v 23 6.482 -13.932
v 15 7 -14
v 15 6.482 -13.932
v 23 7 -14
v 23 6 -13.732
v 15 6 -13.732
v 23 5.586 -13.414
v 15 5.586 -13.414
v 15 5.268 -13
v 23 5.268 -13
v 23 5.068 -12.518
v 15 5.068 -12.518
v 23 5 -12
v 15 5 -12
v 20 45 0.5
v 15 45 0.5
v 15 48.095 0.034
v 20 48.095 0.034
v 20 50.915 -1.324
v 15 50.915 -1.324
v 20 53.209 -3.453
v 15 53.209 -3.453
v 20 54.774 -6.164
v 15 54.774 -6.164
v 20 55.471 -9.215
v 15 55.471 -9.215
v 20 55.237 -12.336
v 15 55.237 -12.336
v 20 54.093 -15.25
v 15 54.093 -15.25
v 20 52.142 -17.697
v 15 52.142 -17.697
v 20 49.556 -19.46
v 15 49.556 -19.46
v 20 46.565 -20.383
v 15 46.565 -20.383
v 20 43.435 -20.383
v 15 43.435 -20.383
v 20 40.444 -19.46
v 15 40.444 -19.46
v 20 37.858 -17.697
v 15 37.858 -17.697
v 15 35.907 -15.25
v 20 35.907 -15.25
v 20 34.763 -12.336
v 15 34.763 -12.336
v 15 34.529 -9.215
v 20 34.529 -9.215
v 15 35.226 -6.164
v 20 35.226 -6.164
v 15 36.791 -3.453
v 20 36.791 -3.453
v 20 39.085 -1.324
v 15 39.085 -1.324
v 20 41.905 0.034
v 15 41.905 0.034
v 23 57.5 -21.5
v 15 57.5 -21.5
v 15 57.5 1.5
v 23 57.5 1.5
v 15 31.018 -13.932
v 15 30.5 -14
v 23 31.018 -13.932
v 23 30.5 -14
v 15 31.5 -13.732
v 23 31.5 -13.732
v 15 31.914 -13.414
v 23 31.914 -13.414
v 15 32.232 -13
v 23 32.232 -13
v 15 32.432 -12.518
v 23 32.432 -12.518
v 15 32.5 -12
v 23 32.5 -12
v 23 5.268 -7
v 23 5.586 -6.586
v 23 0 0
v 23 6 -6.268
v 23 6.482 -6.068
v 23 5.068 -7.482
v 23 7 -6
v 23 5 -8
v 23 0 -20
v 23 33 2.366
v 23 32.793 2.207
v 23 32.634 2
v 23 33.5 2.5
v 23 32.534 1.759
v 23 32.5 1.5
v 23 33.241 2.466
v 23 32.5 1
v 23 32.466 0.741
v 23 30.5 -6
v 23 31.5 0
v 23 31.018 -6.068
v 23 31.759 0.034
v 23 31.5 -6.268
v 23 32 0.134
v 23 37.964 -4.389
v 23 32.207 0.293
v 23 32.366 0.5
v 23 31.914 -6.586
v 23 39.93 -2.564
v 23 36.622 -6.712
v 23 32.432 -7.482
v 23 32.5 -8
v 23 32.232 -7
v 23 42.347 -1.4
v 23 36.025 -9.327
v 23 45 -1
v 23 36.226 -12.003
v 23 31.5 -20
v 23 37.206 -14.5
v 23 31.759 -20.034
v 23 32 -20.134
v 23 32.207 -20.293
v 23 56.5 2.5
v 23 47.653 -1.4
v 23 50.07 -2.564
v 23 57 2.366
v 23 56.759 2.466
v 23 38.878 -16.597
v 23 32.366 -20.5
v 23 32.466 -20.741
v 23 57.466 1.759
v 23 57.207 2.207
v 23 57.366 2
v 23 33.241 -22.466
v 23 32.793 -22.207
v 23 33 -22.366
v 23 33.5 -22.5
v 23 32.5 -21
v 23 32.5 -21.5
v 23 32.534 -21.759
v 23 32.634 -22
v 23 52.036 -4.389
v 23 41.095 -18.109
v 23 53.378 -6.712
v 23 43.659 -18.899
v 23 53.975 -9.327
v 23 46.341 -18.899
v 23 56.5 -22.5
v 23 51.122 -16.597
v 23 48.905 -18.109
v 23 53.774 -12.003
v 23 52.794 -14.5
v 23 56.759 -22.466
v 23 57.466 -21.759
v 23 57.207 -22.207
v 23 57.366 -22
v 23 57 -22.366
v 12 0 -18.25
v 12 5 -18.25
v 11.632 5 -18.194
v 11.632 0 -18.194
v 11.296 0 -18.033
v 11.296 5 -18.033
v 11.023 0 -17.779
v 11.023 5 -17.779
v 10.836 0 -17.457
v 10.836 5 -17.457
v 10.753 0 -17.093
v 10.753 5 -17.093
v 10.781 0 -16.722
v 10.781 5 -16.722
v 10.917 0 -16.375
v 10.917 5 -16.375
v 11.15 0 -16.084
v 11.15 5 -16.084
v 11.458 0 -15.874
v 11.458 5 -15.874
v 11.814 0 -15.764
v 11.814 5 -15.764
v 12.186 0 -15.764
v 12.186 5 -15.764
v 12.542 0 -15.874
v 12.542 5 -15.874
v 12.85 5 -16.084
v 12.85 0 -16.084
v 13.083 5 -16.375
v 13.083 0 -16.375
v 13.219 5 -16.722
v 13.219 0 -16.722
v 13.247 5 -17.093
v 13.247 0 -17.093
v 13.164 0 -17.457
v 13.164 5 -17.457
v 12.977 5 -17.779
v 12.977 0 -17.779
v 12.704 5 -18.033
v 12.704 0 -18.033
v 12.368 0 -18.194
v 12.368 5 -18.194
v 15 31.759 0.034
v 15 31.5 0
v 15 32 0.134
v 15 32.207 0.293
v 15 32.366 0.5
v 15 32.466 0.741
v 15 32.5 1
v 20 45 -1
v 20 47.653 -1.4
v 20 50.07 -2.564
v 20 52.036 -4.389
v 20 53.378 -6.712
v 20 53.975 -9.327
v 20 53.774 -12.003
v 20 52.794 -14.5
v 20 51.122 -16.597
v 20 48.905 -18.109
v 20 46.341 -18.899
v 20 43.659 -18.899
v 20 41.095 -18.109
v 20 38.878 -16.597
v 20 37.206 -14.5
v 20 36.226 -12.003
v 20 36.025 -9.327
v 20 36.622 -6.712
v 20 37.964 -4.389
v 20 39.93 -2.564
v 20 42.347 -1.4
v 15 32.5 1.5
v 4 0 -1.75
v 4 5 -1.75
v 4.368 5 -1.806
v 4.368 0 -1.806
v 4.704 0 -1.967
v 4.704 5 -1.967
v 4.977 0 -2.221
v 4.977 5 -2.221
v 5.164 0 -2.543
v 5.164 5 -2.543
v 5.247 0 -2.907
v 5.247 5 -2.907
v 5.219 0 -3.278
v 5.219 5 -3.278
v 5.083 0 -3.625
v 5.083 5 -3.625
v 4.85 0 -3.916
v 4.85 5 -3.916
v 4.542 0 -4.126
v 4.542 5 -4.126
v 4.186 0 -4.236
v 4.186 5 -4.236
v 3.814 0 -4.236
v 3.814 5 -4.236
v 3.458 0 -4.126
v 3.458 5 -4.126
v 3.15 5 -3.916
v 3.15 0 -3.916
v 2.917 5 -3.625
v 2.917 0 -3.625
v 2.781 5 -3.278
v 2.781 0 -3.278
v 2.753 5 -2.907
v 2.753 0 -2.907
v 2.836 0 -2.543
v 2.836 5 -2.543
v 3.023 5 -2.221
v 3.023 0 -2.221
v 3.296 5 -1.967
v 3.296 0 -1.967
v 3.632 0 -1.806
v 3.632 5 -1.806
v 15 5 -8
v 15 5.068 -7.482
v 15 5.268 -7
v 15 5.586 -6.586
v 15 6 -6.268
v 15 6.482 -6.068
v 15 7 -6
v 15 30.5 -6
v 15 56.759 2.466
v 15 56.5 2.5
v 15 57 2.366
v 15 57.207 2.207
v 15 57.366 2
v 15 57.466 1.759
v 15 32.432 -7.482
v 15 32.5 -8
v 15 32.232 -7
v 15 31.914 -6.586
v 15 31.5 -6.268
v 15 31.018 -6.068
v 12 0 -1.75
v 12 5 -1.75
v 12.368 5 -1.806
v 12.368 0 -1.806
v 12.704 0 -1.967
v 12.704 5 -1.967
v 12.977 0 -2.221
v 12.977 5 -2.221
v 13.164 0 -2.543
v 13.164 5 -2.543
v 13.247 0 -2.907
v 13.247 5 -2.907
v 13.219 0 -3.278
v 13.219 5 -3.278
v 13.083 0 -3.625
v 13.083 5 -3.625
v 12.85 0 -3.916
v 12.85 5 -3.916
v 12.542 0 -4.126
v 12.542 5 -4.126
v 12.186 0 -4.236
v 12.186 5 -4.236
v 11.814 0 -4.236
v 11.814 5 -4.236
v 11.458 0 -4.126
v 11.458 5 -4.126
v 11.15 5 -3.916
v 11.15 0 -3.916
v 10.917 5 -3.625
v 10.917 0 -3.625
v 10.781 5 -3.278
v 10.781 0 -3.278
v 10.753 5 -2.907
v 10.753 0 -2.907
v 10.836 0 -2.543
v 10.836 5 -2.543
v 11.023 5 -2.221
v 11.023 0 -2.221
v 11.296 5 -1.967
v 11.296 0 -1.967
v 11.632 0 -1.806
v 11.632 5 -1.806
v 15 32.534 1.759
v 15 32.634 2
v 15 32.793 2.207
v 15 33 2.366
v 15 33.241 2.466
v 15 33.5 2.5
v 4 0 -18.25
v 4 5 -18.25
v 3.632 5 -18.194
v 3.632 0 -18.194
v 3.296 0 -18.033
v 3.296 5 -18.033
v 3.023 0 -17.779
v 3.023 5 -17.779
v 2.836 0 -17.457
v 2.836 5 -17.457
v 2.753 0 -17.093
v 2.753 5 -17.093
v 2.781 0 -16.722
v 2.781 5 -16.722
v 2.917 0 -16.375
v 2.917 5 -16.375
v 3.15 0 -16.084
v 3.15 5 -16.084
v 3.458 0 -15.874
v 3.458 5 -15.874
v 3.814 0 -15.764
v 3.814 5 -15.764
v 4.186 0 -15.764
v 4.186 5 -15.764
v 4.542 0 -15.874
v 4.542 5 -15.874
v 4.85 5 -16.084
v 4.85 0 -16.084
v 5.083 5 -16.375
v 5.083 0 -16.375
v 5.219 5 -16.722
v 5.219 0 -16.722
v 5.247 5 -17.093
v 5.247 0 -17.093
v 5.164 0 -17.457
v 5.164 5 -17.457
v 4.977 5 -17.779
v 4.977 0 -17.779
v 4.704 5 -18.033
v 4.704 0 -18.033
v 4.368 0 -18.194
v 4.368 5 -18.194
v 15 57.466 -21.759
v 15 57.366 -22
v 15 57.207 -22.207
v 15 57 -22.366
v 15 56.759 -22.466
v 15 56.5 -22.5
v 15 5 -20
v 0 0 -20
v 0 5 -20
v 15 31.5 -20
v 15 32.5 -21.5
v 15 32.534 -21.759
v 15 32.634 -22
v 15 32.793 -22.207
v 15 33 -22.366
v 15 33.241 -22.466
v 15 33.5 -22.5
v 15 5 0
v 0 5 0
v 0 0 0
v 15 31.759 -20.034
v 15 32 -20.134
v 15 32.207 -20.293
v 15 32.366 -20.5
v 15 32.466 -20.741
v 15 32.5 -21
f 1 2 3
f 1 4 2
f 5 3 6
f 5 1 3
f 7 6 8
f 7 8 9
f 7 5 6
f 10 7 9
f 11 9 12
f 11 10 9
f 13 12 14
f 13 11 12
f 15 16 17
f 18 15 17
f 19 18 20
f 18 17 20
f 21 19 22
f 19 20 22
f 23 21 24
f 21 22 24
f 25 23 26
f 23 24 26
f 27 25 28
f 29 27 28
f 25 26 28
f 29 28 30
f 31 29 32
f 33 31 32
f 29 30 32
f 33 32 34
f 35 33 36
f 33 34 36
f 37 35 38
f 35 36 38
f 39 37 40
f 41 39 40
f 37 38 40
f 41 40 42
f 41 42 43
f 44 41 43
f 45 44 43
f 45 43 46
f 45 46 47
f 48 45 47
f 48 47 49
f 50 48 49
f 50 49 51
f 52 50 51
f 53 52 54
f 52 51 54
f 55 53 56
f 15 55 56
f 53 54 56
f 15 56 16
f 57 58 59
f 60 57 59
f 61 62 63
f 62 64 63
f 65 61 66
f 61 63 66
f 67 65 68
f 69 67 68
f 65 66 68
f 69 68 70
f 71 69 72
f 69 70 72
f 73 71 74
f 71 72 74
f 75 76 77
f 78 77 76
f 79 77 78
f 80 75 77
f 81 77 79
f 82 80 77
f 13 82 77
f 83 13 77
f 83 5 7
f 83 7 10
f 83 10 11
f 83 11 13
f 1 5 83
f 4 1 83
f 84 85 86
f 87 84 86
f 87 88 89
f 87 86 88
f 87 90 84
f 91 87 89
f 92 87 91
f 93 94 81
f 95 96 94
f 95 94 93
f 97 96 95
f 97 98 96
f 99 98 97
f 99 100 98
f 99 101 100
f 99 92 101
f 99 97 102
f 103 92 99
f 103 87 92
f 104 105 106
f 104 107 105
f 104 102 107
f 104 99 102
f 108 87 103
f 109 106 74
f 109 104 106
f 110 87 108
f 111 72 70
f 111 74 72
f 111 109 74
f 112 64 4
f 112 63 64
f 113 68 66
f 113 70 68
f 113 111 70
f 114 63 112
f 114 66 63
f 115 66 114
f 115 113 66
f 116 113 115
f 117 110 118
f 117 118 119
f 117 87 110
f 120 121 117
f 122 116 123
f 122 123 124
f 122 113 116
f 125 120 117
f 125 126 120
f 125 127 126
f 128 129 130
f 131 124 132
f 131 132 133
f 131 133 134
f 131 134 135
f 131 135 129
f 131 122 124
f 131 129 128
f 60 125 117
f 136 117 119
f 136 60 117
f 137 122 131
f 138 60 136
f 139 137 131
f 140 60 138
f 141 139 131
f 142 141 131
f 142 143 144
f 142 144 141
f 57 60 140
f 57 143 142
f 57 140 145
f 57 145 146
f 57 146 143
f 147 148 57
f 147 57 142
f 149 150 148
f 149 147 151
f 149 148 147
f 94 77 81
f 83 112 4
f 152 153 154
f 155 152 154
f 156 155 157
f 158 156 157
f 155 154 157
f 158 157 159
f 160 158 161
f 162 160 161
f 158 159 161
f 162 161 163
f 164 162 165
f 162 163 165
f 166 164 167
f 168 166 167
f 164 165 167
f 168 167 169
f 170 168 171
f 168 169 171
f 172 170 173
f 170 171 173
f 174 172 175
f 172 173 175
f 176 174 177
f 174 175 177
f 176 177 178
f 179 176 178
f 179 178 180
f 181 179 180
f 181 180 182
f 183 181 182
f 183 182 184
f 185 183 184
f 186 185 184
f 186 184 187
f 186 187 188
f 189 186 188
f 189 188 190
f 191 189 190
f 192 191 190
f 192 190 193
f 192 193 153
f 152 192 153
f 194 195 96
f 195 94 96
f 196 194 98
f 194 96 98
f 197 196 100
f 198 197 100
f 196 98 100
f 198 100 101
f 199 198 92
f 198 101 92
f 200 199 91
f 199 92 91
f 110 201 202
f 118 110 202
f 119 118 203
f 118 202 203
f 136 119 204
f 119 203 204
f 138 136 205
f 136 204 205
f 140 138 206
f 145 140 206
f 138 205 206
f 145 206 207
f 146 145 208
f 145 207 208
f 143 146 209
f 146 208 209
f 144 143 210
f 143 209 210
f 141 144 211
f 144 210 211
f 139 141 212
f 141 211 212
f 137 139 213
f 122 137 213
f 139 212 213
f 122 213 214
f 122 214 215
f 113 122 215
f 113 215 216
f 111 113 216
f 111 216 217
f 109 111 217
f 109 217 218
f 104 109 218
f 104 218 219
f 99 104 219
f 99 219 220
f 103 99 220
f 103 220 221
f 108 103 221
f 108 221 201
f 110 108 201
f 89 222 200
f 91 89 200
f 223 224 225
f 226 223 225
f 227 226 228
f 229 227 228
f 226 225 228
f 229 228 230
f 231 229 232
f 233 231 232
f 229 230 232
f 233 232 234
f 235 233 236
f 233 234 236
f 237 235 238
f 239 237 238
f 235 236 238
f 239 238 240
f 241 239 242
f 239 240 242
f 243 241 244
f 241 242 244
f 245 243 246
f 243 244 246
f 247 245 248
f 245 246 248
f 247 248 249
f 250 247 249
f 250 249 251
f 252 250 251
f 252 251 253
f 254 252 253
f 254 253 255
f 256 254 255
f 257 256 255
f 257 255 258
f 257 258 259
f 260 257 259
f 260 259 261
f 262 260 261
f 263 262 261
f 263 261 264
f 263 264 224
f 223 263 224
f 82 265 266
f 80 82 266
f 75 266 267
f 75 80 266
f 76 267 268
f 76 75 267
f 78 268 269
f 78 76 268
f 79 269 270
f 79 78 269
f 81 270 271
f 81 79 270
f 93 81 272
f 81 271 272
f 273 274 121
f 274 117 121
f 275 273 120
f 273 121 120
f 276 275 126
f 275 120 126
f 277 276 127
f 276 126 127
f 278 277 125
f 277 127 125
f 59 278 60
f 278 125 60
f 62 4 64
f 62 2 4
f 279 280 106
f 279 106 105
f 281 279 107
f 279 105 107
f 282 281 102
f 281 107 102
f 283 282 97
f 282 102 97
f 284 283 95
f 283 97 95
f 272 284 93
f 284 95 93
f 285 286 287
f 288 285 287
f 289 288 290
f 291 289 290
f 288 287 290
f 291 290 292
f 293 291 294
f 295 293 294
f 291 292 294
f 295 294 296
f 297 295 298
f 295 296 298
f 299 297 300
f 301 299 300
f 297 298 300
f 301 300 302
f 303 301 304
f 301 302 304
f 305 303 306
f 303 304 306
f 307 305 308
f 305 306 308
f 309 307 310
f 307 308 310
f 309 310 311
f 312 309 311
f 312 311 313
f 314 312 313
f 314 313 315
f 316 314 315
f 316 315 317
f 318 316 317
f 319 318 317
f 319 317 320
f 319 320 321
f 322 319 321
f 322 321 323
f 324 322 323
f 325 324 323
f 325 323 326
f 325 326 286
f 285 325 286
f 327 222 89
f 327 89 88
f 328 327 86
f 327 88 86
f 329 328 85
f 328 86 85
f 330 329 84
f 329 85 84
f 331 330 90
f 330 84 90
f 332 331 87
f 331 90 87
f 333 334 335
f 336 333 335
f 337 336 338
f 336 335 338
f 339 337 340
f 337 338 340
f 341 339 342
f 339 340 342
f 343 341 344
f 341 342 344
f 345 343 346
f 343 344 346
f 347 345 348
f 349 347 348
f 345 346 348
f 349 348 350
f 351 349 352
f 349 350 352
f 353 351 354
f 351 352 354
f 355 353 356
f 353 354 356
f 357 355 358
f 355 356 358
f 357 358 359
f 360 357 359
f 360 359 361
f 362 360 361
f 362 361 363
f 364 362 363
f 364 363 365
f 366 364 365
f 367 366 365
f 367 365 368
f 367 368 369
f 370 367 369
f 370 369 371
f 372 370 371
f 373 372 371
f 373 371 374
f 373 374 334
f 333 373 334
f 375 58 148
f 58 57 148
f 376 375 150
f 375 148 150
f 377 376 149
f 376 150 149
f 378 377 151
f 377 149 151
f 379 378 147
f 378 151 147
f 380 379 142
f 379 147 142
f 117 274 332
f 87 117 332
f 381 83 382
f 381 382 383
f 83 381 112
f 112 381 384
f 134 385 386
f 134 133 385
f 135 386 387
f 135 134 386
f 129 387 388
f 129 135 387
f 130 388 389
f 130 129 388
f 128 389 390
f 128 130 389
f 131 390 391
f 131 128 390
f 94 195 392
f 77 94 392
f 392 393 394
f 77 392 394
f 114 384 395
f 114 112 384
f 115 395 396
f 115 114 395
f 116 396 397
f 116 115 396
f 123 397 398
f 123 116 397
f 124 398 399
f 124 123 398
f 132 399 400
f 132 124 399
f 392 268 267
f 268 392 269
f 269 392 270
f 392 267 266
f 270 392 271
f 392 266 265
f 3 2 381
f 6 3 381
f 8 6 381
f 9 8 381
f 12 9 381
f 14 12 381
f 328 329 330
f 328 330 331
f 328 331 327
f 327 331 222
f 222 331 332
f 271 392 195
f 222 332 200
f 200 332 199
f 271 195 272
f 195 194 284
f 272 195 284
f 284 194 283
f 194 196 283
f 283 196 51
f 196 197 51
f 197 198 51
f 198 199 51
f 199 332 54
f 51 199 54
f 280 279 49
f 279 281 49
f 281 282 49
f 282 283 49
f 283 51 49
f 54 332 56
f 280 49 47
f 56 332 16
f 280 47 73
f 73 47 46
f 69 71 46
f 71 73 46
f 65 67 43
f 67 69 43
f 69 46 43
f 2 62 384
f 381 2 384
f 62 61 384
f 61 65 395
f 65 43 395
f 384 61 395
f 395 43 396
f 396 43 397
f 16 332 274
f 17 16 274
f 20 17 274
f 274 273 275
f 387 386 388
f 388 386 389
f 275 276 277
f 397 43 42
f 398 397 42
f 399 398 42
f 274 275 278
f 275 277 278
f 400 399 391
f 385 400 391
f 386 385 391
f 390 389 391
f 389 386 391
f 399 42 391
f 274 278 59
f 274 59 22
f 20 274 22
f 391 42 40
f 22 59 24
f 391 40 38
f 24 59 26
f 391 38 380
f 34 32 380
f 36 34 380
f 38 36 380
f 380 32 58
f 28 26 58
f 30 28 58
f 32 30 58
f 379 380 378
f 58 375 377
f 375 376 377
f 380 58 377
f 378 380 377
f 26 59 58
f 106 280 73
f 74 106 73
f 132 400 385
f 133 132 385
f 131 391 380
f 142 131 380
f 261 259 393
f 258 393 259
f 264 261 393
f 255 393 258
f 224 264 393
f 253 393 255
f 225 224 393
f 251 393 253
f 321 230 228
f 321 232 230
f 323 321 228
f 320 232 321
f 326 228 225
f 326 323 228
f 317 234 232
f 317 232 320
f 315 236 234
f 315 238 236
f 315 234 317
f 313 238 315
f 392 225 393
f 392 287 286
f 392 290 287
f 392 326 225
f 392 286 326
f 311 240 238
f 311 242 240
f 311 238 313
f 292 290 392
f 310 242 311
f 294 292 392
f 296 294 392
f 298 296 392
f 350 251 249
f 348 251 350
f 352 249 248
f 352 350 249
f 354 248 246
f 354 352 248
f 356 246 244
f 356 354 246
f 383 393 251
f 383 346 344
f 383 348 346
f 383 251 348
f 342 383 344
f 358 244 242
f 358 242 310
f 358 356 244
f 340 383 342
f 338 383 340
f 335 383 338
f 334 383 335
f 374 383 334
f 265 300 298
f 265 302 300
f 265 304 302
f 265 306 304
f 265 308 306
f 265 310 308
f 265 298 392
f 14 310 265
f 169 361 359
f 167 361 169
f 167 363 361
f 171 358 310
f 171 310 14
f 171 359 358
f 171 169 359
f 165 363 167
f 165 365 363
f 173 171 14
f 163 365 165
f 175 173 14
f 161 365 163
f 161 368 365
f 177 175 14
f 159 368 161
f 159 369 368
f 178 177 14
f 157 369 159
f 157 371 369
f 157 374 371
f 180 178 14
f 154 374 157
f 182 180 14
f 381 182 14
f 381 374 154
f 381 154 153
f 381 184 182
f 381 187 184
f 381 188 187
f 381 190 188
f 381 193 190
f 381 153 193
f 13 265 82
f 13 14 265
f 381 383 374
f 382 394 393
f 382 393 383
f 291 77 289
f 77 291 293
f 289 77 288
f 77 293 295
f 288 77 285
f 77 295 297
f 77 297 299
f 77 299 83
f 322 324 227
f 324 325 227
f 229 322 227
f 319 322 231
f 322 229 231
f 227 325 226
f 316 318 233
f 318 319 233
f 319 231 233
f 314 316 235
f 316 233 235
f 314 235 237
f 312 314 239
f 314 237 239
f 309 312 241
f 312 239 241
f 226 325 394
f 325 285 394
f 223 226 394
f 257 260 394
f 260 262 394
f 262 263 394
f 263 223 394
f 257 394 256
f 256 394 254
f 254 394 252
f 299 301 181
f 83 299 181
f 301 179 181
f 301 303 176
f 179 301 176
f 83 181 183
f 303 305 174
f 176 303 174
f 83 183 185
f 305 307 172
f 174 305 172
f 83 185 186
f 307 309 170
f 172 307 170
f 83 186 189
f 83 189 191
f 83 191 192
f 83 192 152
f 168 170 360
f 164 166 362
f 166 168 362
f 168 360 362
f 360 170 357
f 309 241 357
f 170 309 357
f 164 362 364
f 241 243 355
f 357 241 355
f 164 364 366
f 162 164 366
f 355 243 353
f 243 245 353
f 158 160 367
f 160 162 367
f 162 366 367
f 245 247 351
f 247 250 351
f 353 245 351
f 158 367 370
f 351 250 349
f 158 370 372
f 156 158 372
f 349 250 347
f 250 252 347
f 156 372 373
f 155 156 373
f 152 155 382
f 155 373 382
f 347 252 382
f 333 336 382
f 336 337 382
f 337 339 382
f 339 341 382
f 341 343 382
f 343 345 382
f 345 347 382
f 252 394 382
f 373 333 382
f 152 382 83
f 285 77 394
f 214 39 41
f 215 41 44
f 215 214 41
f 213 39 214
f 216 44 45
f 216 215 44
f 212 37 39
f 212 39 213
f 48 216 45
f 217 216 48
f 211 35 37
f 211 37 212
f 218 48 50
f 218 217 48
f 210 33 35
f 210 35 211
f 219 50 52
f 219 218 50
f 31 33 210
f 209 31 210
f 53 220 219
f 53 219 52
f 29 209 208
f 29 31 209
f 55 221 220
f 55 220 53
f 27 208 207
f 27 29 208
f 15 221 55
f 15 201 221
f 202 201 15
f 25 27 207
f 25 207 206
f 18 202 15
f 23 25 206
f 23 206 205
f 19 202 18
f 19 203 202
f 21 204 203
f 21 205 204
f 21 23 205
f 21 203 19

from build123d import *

# Parameters (mm, degrees)
SKETCH1_W                = 20
SKETCH1_H                = 20
BOSS_EXTRUDE1_DEPTH      = 5
BOSS_EXTRUDE2_DEPTH      = 3
BOSS_EXTRUDE2_DEPTH_BACK = 5
SKETCH2_W                = 6
SKETCH2_H                = 27.5
SKETCH2_W_2              = 20
SKETCH2_H_2              = 5
CUT_EXTRUDE1_REACH       = 63.575
SKETCH4_R                = 1.25
SKETCH8_R                = 10.5
CUT_EXTRUDE4_DEPTH       = 5
CUT_EXTRUDE5_REACH       = 66.904
SKETCH9_R                = 9
FILLET2_R                = 1
FILLET3_R                = 2


with BuildPart() as part:
    # Sketch1 → Boss-Extrude1 (new body)
    with BuildSketch(Plane(origin=(0, 0, 0), x_dir=(1, 0, 0), z_dir=(0, 1, 0))):
        with Locations((10, 10)):
            Rectangle(SKETCH1_W, SKETCH1_H)
    extrude(amount=BOSS_EXTRUDE1_DEPTH)

    # Sketch2 → Boss-Extrude2 (add, two sides: drawn at the far end of the back side and taken through both)
    with BuildSketch(Plane(origin=(20, 0, 0), x_dir=(0, 0, -1), z_dir=(1, 0, 0)).offset(-BOSS_EXTRUDE2_DEPTH_BACK)):
        with Locations((17, 18.75)):
            Rectangle(SKETCH2_W, SKETCH2_H)
        with Locations((3, 18.75)):
            Rectangle(SKETCH2_W, SKETCH2_H)
        with Locations((10, 2.5)):
            Rectangle(SKETCH2_W_2, SKETCH2_H_2)
        Polygon((-2.5, 32.5), (0, 32.5), (6, 32.5), (14, 32.5), (20, 32.5), (22.5, 32.5), (22.5, 57.5), (-2.5, 57.5), align=None)
    extrude(amount=BOSS_EXTRUDE2_DEPTH + BOSS_EXTRUDE2_DEPTH_BACK)

    # Sketch4 → Cut-Extrude1 (cut, up to next)
    with BuildSketch(Plane(origin=(0, 5, 0), x_dir=(1, 0, 0), z_dir=(0, 1, 0)), mode=Mode.PRIVATE) as cut_extrude1_sk1:
        with Locations(Location((12, 3, 0), (0, 0, 270))):
            Circle(SKETCH4_R)
    cut_extrude1_tool1 = extrude(cut_extrude1_sk1.sketch, amount=-CUT_EXTRUDE1_REACH, mode=Mode.PRIVATE) & part.part
    # Sketch4 → Cut-Extrude1 (cut, up to next)
    with BuildSketch(Plane(origin=(0, 5, 0), x_dir=(1, 0, 0), z_dir=(0, 1, 0)), mode=Mode.PRIVATE) as cut_extrude1_sk2:
        with Locations(Location((4, 3, 0), (0, 0, 270))):
            Circle(SKETCH4_R)
    cut_extrude1_tool2 = extrude(cut_extrude1_sk2.sketch, amount=-CUT_EXTRUDE1_REACH, mode=Mode.PRIVATE) & part.part
    # Sketch4 → Cut-Extrude1 (cut, up to next)
    with BuildSketch(Plane(origin=(0, 5, 0), x_dir=(1, 0, 0), z_dir=(0, 1, 0)), mode=Mode.PRIVATE) as cut_extrude1_sk3:
        with Locations(Location((12, 17, 0), (0, 0, 90))):
            Circle(SKETCH4_R)
    cut_extrude1_tool3 = extrude(cut_extrude1_sk3.sketch, amount=-CUT_EXTRUDE1_REACH, mode=Mode.PRIVATE) & part.part
    # Sketch4 → Cut-Extrude1 (cut, up to next)
    with BuildSketch(Plane(origin=(0, 5, 0), x_dir=(1, 0, 0), z_dir=(0, 1, 0)), mode=Mode.PRIVATE) as cut_extrude1_sk4:
        with Locations(Location((4, 17, 0), (0, 0, 90))):
            Circle(SKETCH4_R)
    cut_extrude1_tool4 = extrude(cut_extrude1_sk4.sketch, amount=-CUT_EXTRUDE1_REACH, mode=Mode.PRIVATE) & part.part
    add(cut_extrude1_tool1.solids().sort_by_distance((12, 5, -3))[0], mode=Mode.SUBTRACT)
    add(cut_extrude1_tool2.solids().sort_by_distance((4, 5, -3))[0], mode=Mode.SUBTRACT)
    add(cut_extrude1_tool3.solids().sort_by_distance((12, 5, -17))[0], mode=Mode.SUBTRACT)
    add(cut_extrude1_tool4.solids().sort_by_distance((4, 5, -17))[0], mode=Mode.SUBTRACT)

    # Sketch8 → Cut-Extrude4 (cut)
    with BuildSketch(Plane.ZY.offset(-15)):
        with Locations((-10, 45)):
            Circle(SKETCH8_R)
    extrude(amount=-CUT_EXTRUDE4_DEPTH, mode=Mode.SUBTRACT)

    # Sketch9 → Cut-Extrude5 (cut, up to next)
    with BuildSketch(Plane.ZY.offset(-20), mode=Mode.PRIVATE) as cut_extrude5_sk1:
        with Locations((-10, 45)):
            Circle(SKETCH9_R)
    cut_extrude5_tool1 = extrude(cut_extrude5_sk1.sketch, amount=-CUT_EXTRUDE5_REACH, mode=Mode.PRIVATE) & part.part
    add(cut_extrude5_tool1.solids().sort_by_distance((20, 45, -10))[0], mode=Mode.SUBTRACT)

    # Fillet2
    fillet2_edges = [part.edges().sort_by_distance(p)[0] for p in [
        (19, 32.5, -20),
        (19, 32.5, 0),
        (19, 32.5, 2.5),
        (19, 57.5, 2.5),
        (19, 57.5, -22.5),
        (19, 32.5, -22.5),
    ]]
    fillet(fillet2_edges, radius=FILLET2_R)

    # Fillet3
    fillet3_edges = [part.edges().sort_by_distance(p)[0] for p in [
        (19, 5, -6),
        (19, 32.5, -6),
        (19, 5, -14),
        (19, 32.5, -14),
    ]]
    fillet(fillet3_edges, radius=FILLET3_R)


solid = part.part
